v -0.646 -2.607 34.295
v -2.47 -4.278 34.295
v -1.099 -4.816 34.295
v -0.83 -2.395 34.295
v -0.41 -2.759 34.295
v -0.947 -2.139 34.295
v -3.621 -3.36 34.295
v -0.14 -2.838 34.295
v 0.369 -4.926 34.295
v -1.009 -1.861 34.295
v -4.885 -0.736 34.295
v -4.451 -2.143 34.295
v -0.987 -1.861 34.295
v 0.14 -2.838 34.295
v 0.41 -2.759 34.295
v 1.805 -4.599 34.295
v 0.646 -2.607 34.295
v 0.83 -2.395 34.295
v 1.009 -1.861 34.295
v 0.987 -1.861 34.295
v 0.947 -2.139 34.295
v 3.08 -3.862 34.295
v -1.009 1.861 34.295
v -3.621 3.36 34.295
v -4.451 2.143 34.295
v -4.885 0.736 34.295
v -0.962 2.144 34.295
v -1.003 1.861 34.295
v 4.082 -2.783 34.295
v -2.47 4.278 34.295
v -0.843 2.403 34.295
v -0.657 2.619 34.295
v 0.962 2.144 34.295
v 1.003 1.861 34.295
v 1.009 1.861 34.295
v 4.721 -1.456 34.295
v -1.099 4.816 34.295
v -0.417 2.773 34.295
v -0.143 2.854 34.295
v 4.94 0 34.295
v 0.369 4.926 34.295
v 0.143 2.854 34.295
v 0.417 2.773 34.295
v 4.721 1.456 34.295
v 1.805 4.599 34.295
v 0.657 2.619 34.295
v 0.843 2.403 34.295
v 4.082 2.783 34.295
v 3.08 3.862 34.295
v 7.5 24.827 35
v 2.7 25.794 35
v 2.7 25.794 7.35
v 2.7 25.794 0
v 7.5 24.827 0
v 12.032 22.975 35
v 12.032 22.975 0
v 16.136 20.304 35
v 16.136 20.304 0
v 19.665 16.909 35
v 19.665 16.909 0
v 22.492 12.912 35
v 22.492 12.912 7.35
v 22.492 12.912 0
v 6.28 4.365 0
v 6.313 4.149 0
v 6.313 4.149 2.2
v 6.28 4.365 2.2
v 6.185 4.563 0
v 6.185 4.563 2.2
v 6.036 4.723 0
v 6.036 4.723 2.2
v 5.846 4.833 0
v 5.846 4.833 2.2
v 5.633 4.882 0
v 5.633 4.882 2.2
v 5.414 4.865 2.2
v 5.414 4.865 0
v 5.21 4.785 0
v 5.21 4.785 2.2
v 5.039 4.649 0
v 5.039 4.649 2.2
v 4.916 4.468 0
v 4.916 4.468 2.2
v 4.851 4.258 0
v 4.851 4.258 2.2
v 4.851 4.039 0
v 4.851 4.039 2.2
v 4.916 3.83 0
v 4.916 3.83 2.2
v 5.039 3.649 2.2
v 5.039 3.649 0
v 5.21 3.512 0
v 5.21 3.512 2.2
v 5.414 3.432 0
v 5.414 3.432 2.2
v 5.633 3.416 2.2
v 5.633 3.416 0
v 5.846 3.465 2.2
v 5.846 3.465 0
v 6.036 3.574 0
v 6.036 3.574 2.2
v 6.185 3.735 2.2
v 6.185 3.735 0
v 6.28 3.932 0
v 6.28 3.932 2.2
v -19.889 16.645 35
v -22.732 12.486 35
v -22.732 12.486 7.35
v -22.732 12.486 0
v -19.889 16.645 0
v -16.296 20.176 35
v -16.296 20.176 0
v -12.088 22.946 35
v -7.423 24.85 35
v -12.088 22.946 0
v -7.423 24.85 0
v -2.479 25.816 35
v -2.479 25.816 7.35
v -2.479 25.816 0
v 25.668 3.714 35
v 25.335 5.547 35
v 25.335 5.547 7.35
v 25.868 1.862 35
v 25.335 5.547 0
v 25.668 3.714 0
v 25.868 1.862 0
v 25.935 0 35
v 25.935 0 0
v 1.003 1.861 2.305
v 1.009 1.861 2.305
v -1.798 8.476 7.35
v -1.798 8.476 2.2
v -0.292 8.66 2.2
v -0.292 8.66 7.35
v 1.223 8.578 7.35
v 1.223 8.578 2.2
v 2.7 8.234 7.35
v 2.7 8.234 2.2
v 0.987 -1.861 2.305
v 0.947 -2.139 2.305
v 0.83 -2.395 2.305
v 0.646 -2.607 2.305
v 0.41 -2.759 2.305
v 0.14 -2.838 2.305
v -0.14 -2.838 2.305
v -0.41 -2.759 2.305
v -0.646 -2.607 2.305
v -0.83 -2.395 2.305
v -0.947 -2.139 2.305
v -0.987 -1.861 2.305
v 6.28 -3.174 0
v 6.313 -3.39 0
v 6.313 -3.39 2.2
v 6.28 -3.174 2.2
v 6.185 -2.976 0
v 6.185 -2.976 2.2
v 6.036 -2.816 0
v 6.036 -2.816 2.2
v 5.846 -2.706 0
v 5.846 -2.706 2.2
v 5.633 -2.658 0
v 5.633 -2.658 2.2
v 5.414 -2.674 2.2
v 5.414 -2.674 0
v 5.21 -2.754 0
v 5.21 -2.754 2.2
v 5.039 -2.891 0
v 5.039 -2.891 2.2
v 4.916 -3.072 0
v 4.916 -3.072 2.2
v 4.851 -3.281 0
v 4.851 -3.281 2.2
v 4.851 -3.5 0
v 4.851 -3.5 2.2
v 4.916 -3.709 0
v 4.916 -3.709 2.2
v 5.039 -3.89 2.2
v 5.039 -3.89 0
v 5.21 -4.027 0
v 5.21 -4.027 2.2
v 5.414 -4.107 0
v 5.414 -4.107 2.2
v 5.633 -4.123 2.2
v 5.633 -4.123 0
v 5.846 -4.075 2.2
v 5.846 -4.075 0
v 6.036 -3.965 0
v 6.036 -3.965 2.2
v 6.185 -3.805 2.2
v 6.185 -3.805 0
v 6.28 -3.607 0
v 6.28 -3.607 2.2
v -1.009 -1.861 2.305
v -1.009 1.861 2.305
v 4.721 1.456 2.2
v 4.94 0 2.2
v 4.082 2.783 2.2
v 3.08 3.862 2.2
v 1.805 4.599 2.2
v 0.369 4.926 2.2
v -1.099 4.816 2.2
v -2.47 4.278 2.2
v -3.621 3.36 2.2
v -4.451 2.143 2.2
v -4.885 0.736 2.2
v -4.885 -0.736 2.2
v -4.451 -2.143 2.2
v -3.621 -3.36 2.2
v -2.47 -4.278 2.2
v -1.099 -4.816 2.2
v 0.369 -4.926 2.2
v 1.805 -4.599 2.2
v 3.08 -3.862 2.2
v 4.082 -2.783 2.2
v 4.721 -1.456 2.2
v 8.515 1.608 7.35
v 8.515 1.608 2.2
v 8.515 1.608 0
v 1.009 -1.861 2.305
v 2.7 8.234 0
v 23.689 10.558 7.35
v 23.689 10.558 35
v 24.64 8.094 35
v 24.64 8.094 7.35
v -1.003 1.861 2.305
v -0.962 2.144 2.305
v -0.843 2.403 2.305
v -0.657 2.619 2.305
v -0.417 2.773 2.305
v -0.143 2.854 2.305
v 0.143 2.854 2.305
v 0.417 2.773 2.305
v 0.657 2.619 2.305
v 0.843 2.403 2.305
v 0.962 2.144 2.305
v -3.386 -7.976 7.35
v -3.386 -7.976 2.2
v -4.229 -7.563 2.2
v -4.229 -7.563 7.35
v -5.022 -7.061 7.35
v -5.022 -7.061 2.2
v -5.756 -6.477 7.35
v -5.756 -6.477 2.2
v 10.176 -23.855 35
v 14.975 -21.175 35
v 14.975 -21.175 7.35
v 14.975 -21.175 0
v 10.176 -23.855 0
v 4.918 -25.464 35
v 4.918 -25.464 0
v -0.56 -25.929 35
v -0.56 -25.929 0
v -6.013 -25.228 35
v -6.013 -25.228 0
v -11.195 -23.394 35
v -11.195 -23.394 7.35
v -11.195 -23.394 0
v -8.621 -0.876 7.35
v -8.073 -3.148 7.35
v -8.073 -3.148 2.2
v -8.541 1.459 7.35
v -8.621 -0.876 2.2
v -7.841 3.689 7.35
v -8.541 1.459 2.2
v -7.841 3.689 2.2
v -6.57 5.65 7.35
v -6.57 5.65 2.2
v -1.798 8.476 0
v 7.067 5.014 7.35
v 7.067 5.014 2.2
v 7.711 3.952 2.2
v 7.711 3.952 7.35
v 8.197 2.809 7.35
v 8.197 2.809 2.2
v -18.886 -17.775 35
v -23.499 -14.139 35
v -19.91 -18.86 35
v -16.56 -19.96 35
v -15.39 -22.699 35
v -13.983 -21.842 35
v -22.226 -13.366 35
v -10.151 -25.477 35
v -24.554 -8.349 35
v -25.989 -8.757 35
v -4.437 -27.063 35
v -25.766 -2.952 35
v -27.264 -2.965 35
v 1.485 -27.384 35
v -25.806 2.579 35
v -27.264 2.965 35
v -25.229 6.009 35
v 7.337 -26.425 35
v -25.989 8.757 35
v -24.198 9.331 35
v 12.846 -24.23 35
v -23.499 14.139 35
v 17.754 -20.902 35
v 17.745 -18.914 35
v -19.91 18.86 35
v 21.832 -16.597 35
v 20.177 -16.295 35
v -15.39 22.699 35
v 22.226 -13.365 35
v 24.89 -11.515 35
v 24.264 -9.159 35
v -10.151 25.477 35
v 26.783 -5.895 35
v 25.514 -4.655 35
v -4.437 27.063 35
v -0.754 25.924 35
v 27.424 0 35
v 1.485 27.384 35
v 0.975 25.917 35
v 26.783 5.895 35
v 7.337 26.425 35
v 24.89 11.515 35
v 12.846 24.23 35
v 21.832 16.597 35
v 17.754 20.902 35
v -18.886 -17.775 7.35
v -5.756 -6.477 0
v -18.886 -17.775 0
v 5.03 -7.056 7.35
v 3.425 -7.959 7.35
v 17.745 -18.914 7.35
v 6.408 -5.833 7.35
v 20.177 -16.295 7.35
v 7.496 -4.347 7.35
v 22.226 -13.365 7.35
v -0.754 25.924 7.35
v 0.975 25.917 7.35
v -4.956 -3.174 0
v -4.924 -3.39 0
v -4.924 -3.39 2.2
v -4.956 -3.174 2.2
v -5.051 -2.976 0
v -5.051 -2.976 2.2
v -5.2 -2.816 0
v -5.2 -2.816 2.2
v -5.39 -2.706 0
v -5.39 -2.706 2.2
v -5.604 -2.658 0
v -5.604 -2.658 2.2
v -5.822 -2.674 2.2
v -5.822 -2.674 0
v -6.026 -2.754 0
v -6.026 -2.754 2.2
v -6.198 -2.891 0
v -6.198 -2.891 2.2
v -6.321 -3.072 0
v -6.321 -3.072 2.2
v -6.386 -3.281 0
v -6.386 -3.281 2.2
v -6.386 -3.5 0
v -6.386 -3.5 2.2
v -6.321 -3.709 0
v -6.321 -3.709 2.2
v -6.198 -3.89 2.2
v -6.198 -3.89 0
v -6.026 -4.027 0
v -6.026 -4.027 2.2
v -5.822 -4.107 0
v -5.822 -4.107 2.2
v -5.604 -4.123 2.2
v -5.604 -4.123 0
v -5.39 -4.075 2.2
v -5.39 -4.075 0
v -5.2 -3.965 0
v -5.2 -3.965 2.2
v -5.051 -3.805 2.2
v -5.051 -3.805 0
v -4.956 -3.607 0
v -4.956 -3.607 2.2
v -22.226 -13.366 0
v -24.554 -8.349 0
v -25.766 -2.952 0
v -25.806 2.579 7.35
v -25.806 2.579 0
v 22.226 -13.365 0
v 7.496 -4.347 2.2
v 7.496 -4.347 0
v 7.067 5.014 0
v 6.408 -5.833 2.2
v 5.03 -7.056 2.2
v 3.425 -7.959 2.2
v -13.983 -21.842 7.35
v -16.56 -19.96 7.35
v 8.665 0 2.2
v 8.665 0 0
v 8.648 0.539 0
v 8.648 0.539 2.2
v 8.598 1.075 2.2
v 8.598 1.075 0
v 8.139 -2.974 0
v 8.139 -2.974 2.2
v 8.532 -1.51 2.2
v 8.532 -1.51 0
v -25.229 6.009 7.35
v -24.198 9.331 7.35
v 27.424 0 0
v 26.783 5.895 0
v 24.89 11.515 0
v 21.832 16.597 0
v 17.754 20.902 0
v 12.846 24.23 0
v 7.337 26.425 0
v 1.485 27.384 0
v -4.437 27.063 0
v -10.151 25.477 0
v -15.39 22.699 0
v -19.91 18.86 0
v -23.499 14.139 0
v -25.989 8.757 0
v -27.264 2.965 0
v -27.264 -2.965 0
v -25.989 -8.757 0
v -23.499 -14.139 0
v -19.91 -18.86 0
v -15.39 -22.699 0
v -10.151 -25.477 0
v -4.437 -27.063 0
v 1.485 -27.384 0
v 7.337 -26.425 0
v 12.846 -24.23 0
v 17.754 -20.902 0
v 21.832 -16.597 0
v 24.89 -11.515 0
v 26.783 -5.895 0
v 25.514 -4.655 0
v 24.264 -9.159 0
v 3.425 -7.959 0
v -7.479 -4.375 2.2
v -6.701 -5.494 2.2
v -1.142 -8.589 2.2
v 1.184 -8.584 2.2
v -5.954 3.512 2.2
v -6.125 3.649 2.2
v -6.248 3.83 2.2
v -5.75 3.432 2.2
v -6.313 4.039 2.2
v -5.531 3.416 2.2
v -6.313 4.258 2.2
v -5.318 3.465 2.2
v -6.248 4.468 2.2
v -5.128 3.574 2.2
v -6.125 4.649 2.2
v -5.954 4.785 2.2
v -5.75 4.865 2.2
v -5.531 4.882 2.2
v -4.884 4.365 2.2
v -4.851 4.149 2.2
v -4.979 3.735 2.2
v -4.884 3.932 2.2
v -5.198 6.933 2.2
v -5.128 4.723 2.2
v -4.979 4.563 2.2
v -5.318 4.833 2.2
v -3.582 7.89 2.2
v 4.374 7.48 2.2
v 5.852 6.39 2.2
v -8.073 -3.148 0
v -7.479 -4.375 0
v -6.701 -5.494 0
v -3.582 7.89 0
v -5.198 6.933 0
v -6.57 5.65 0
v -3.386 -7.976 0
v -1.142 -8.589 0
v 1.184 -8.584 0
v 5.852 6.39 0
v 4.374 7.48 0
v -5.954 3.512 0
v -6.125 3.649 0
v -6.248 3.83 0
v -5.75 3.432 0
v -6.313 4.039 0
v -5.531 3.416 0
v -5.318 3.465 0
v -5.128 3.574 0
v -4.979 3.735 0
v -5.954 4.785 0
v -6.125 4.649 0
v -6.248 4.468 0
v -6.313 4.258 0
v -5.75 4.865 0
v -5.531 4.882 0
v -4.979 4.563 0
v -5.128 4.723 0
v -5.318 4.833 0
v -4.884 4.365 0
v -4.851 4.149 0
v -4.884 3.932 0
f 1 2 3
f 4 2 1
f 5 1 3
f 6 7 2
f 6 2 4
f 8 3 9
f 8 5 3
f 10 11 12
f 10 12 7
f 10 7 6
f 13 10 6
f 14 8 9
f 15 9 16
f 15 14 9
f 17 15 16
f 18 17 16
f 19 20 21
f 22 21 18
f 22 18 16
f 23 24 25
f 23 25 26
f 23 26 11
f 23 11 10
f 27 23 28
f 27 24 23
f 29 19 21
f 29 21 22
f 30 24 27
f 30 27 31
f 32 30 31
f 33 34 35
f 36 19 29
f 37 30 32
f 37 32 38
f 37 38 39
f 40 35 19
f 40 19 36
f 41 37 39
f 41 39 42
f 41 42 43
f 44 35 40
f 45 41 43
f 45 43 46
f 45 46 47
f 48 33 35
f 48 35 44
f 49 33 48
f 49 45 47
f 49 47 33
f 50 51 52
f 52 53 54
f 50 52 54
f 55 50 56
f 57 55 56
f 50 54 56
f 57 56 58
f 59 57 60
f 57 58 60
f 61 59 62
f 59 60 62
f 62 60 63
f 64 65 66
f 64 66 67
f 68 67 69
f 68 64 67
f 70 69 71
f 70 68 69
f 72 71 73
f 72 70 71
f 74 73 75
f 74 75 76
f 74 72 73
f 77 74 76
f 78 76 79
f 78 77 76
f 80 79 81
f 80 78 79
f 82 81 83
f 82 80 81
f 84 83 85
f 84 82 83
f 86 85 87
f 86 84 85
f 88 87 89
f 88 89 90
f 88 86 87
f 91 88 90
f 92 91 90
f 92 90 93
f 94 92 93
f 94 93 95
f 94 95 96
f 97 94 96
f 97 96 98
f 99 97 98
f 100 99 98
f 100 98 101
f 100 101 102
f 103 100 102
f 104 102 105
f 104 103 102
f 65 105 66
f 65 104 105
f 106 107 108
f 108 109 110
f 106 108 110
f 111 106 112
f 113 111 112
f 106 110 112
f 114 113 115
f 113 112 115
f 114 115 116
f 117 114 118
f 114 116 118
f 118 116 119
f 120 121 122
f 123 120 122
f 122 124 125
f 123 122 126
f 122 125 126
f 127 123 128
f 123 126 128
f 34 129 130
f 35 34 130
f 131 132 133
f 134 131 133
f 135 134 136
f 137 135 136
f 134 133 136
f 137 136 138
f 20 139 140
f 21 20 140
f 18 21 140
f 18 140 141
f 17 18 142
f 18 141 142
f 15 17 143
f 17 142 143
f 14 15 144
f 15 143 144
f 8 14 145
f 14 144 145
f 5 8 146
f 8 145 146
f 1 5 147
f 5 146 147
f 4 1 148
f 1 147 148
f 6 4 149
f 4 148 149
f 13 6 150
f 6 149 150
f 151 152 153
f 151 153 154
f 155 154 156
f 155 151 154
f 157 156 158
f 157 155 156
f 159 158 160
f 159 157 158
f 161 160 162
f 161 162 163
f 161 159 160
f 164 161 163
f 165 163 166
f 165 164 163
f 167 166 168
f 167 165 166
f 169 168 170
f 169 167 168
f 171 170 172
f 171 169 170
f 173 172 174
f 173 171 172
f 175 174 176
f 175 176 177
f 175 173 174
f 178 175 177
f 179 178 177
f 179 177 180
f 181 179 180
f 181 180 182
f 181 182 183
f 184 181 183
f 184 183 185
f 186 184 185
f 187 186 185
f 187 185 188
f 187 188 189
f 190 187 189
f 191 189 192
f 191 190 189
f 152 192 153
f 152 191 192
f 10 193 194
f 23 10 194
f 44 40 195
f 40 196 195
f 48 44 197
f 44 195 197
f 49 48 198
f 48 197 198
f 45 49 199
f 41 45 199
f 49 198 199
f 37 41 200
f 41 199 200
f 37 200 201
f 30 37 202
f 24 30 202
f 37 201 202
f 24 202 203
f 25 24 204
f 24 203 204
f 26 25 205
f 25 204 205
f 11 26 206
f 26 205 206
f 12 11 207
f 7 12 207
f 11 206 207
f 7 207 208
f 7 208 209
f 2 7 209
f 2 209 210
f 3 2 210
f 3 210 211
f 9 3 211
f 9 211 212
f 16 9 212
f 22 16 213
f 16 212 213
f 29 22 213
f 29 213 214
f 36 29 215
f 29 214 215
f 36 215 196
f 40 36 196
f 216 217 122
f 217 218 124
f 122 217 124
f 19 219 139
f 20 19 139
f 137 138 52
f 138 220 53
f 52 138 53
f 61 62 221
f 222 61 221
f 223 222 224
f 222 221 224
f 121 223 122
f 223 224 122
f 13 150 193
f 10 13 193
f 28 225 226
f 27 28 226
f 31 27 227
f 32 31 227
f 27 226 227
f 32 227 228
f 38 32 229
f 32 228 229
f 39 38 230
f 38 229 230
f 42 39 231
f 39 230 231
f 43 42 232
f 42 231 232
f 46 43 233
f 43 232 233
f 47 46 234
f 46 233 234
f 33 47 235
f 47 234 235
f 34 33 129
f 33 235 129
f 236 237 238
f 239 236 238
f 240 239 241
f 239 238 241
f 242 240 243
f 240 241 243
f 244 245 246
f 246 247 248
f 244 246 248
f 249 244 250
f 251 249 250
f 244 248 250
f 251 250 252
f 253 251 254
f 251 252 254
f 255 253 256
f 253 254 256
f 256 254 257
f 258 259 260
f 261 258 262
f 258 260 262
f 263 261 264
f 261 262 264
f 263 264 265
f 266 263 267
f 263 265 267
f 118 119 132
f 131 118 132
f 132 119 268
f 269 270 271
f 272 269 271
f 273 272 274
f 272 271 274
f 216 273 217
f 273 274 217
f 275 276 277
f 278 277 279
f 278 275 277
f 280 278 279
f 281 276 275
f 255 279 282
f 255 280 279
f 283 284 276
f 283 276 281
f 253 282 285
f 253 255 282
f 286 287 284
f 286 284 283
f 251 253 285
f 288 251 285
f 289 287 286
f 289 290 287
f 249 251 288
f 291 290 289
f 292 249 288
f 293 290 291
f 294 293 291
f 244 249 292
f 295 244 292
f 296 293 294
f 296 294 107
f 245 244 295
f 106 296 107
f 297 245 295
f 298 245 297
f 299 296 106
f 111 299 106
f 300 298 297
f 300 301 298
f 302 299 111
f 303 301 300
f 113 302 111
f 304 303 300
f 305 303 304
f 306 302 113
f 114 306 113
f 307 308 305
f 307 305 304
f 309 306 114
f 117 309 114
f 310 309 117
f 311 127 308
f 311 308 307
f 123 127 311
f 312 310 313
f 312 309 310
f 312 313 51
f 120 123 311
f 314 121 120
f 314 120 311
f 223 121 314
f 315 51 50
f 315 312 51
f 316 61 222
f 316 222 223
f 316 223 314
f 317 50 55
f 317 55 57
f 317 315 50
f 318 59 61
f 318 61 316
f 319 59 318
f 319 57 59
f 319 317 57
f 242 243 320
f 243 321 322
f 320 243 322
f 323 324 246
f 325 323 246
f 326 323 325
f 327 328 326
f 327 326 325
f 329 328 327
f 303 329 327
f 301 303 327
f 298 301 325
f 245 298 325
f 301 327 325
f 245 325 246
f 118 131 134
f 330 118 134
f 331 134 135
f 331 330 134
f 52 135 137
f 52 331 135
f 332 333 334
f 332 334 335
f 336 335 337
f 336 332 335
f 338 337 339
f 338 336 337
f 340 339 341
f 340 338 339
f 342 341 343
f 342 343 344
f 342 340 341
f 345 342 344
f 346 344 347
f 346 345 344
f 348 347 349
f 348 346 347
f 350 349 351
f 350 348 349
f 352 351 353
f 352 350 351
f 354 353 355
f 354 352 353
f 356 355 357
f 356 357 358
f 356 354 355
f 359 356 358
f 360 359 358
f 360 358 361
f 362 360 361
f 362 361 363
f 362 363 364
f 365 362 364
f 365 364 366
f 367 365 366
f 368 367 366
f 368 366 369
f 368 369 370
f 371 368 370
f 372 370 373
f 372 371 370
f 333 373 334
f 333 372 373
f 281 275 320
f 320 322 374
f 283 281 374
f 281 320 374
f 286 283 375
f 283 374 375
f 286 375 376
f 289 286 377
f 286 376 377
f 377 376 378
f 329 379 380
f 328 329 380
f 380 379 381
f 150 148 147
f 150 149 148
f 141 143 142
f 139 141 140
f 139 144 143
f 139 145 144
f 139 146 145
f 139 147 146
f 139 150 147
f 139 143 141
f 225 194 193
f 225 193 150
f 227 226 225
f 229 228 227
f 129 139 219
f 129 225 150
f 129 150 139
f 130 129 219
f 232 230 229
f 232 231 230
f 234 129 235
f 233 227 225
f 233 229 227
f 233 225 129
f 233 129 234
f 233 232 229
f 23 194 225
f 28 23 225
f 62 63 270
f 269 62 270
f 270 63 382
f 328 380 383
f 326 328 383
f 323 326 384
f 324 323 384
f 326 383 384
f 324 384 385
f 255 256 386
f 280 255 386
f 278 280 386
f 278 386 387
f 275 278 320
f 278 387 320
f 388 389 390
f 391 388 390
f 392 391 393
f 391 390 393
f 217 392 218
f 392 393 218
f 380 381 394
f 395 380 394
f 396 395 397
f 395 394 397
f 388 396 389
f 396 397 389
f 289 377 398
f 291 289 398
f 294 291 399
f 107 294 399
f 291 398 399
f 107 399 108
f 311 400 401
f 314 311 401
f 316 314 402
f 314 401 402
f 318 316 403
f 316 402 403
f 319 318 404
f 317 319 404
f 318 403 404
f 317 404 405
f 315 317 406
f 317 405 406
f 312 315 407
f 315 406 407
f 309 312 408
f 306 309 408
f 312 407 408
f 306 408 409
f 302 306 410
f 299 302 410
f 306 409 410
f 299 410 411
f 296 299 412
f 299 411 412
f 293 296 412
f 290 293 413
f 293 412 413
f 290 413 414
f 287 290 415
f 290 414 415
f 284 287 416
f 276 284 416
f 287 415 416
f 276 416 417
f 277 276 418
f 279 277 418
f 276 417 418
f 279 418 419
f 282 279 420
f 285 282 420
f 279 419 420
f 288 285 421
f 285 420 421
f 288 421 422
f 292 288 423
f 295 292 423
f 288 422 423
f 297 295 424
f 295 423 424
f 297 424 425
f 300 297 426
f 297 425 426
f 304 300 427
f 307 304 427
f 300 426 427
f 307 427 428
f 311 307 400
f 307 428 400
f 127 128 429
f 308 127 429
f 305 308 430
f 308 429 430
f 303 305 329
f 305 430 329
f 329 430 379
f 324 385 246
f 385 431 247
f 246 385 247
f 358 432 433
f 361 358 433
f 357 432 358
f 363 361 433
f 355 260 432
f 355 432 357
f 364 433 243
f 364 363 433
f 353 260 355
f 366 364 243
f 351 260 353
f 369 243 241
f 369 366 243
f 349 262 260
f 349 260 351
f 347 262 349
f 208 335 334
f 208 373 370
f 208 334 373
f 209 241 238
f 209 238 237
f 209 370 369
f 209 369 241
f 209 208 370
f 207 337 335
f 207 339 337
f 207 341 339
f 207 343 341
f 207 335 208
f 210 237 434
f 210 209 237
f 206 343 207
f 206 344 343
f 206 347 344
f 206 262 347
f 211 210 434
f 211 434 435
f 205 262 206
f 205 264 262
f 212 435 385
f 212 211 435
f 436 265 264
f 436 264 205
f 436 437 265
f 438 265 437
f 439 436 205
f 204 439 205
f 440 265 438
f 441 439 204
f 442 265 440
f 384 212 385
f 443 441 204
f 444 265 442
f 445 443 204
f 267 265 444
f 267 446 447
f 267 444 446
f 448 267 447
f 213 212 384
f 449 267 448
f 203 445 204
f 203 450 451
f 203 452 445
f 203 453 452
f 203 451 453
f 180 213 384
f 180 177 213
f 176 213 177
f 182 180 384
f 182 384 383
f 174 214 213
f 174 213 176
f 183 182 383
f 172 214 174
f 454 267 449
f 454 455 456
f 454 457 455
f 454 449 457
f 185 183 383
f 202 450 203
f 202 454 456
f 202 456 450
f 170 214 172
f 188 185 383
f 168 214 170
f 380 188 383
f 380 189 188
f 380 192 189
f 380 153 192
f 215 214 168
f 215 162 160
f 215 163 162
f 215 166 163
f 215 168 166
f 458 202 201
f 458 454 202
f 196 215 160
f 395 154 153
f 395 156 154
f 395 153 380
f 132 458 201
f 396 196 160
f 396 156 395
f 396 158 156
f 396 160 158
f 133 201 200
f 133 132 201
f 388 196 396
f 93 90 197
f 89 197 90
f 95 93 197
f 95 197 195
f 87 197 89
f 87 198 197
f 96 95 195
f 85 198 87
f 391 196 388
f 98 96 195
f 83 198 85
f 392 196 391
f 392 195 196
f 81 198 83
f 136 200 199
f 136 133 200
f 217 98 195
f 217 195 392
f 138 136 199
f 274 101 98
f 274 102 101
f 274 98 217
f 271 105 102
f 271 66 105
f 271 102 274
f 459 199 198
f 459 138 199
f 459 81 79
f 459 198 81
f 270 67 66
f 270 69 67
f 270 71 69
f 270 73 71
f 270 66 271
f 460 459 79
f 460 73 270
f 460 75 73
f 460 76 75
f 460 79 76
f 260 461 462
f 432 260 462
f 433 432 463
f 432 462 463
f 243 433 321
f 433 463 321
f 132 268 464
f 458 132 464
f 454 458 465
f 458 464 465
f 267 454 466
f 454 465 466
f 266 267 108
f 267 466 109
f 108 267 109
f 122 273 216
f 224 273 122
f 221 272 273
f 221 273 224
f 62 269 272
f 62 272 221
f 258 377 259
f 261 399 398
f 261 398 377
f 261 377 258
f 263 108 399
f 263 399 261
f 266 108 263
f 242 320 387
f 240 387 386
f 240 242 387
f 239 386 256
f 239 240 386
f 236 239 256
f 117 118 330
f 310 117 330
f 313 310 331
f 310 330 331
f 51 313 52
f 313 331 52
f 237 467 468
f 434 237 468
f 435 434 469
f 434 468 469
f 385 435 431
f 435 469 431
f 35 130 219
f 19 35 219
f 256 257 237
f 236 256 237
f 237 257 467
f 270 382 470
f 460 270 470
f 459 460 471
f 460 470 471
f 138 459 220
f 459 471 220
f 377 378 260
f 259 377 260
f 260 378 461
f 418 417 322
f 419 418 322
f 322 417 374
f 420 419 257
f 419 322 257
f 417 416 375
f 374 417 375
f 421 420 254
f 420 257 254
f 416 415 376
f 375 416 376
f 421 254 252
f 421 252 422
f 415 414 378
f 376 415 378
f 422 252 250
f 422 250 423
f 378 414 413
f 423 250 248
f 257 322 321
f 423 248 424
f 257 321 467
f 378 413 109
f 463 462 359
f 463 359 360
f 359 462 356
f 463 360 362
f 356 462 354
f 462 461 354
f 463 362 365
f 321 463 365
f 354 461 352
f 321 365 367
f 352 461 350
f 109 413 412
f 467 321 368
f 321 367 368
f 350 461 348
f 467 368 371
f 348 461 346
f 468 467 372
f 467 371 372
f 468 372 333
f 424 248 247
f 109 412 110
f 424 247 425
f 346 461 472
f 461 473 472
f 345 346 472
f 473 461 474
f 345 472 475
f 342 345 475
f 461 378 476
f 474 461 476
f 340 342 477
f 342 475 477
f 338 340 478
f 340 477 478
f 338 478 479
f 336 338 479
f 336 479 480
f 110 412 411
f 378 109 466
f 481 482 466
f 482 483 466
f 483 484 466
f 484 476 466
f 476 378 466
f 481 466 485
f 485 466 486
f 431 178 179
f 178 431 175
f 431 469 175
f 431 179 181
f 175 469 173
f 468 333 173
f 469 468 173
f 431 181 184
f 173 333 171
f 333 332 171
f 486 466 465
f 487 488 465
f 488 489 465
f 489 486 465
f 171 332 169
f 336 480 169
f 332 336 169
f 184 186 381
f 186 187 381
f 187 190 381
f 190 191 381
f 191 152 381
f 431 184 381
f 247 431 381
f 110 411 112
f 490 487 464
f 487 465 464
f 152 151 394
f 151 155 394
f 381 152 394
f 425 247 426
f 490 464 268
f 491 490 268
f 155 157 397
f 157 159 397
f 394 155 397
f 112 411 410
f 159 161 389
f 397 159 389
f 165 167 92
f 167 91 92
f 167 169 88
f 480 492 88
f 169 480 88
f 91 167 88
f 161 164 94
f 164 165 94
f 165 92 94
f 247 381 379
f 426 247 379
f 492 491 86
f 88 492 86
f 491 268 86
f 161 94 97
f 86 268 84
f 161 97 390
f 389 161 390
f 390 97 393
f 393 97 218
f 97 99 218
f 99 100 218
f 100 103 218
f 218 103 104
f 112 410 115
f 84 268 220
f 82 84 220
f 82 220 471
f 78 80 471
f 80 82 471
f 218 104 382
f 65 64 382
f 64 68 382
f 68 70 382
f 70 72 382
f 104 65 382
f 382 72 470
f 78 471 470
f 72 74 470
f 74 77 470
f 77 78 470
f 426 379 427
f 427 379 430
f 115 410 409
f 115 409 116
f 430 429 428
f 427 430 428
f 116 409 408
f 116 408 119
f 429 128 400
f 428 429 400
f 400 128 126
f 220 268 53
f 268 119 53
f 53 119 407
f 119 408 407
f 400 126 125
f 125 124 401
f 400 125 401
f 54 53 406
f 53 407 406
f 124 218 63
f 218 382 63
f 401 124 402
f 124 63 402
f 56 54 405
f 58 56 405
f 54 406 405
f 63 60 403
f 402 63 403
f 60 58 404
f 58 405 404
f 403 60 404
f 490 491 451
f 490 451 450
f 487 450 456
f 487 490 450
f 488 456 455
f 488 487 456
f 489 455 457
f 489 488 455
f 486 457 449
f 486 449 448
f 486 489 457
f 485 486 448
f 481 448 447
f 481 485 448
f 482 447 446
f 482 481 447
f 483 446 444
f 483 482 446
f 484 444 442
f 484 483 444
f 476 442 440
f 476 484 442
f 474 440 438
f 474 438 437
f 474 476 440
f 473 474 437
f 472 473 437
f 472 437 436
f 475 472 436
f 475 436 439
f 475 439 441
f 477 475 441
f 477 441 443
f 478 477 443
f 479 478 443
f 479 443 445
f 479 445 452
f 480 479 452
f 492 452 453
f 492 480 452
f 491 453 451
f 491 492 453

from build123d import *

# Parameters (mm, degrees)
F0_R     = 27.4243717003
F1_DEPTH = 35
F2_DEPTH = 7.35
F0_R_2   = 0.735
F0_R_3   = 4.94
F3_DEPTH = 2.2
F4_DEPTH = 2.30452
F5_R     = 4.94
F6_DEPTH = 31.99051


with BuildPart() as f1:
    # F0 (on Top) → F1 (new body)
    with BuildSketch(Plane.XY):
        Circle(F0_R)
        with BuildLine():
            ThreePointArc((22.4924149425, 12.9118354642), (24.1955551249, 9.3380585348), (25.3349236359, 5.546698961))
            ThreePointArc((25.3349236359, 5.546698961), (25.7845444937, 2.789532264), (25.935, 0))
            ThreePointArc((25.935, 0), (24.9905557449, -6.935153103), (22.2260084009, -13.3652076513))
            ThreePointArc((22.2260084009, -13.3652076513), (19.0060906975, -17.6463237361), (14.9753258207, -21.1746036932))
            ThreePointArc((14.9753258207, -21.1746036932), (2.1917464406, -25.8422226703), (-11.1953286546, -23.3942052935))
            ThreePointArc((-11.1953286546, -23.3942052935), (-15.3006955677, -20.9407005648), (-18.8857364827, -17.775071941))
            ThreePointArc((-18.8857364827, -17.775071941), (-24.5544366053, -8.3488842366), (-25.8064478461, 2.5790452823))
            ThreePointArc((-25.8064478461, 2.5790452823), (-24.7694228602, 7.6876469855), (-22.7317421539, 12.4856767398))
            ThreePointArc((-22.7317421539, 12.4856767398), (-14.2591316257, 21.6633651652), (-2.4791175308, 25.8162391))
            ThreePointArc((-2.4791175308, 25.8162391), (0.1109366843, 25.9347627337), (2.6998821615, 25.7940857817))
            ThreePointArc((2.6998821615, 25.7940857817), (14.1474750982, 21.7364480388), (22.4924149425, 12.9118354642))
        make_face(mode=Mode.SUBTRACT)
    extrude(amount=F1_DEPTH)

    # F0 (on Top) → F2 (join)
    with BuildSketch(Plane.XY):
        with BuildLine():
            Line((22.2260084009, -13.3652076513), (7.4958561826, -4.3467648993))
            ThreePointArc((7.4958561826, -4.3467648993), (5.751506041, -6.4809261113), (3.4251739378, -7.959296985))
            Line((3.4251739378, -7.959296985), (14.9753258207, -21.1746036932))
            ThreePointArc((14.9753258207, -21.1746036932), (19.0060906975, -17.6463237361), (22.2260084009, -13.3652076513))
        make_face()
        with BuildLine():
            ThreePointArc((7.0672034825, 5.0136673141), (7.9748170172, 3.3888816064), (8.5145365353, 1.6077601153))
            Line((8.5145365353, 1.6077601153), (25.3349236359, 5.546698961))
            ThreePointArc((25.3349236359, 5.546698961), (24.1955551249, 9.3380585348), (22.4924149425, 12.9118354642))
            Line((22.4924149425, 12.9118354642), (7.0672034825, 5.0136673141))
        make_face()
        with BuildLine():
            ThreePointArc((-1.7975824717, 8.4764923322), (0.4672047175, 8.6523953187), (2.6998821615, 8.2336420443))
            Line((2.6998821615, 8.2336420443), (2.6998821615, 25.7940857817))
            ThreePointArc((2.6998821615, 25.7940857817), (0.1109366843, 25.9347627337), (-2.4791175308, 25.8162391))
            Line((-2.4791175308, 25.8162391), (-1.7975824717, 8.4764923322))
        make_face()
        with BuildLine():
            ThreePointArc((-8.0730394743, -3.1477386559), (-8.5412222171, 1.4593656284), (-6.569904314, 5.6496532907))
            Line((-6.569904314, 5.6496532907), (-22.7317421539, 12.4856767398))
            ThreePointArc((-22.7317421539, 12.4856767398), (-24.7694228602, 7.6876469855), (-25.8064478461, 2.5790452823))
            Line((-25.8064478461, 2.5790452823), (-8.0730394743, -3.1477386559))
        make_face()
        with BuildLine():
            Line((-11.1953286546, -23.3942052935), (-3.3863183591, -7.9759057774))
            ThreePointArc((-3.3863183591, -7.9759057774), (-4.6322458356, -7.3228767242), (-5.7560910789, -6.4768542126))
            Line((-5.7560910789, -6.4768542126), (-18.8857364827, -17.775071941))
            ThreePointArc((-18.8857364827, -17.775071941), (-15.3006955677, -20.9407005648), (-11.1953286546, -23.3942052935))
        make_face()
    extrude(amount=F2_DEPTH)

    # F0 (on Top) → F3 (join)
    with BuildSketch(Plane.XY):
        with BuildLine():
            ThreePointArc((7.4958561826, -4.3467648993), (8.3676107349, -2.2506255995), (8.665, 0))
            ThreePointArc((8.665, 0), (8.6273021298, 0.807392693), (8.5145365353, 1.6077601153))
            ThreePointArc((8.5145365353, 1.6077601153), (7.9748170172, 3.3888816064), (7.0672034825, 5.0136673141))
            ThreePointArc((7.0672034825, 5.0136673141), (5.1420861341, 6.9743225614), (2.6998821615, 8.2336420443))
            ThreePointArc((2.6998821615, 8.2336420443), (0.4672047175, 8.6523953187), (-1.7975824717, 8.4764923322))
            ThreePointArc((-1.7975824717, 8.4764923322), (-4.4160461409, 7.4552505981), (-6.569904314, 5.6496532907))
            ThreePointArc((-6.569904314, 5.6496532907), (-8.5412222171, 1.4593656284), (-8.0730394743, -3.1477386559))
            ThreePointArc((-8.0730394743, -3.1477386559), (-7.1120999404, -4.9497736754), (-5.7560910789, -6.4768542126))
            ThreePointArc((-5.7560910789, -6.4768542126), (-4.6322458356, -7.3228767242), (-3.3863183591, -7.9759057774))
            ThreePointArc((-3.3863183591, -7.9759057774), (0.0211282274, -8.664974241), (3.4251739378, -7.959296985))
            ThreePointArc((3.4251739378, -7.959296985), (5.751506041, -6.4809261113), (7.4958561826, -4.3467648993))
        make_face()
        with Locations((-5.658719223, -3.3904951997)):
            Circle(F0_R_2, mode=Mode.SUBTRACT)
        with Locations((5.5777155794, -3.3904951997)):
            Circle(F0_R_2, mode=Mode.SUBTRACT)
        with Locations((-5.5862264708, 4.1487901472)):
            Circle(F0_R_2, mode=Mode.SUBTRACT)
        Circle(F0_R_3, mode=Mode.SUBTRACT)
        with Locations((5.5777155794, 4.1487901472)):
            Circle(F0_R_2, mode=Mode.SUBTRACT)
    extrude(amount=F3_DEPTH)

    # F0 (on Top) → F4 (join)
    with BuildSketch(Plane.XY):
        Circle(F0_R_3)
    extrude(amount=F4_DEPTH)

    # F5 (on face) → F6 (join)
    with BuildSketch(Plane.XY.offset(2.30452)):
        Circle(F5_R)
        with BuildLine():
            Line((1.0092968587, 1.861386816), (1.0092968587, -1.861386816))
            Line((1.0092968587, -1.861386816), (0.9870916385, -1.861386816))
            ThreePointArc((0.9870916385, -1.861386816), (0, -2.8484784545), (-0.9870916385, -1.861386816))
            Line((-0.9870916385, -1.861386816), (-1.0092968587, -1.861386816))
            Line((-1.0092968587, -1.861386816), (-1.0092968587, 1.861386816))
            Line((-1.0092968587, 1.861386816), (-1.0026240675, 1.861386816))
            ThreePointArc((-1.0026240675, 1.861386816), (0, 2.8640108835), (1.0026240675, 1.861386816))
            Line((1.0026240675, 1.861386816), (1.0092968587, 1.861386816))
        make_face(mode=Mode.SUBTRACT)
    extrude(amount=F6_DEPTH)


solid = f1.part
